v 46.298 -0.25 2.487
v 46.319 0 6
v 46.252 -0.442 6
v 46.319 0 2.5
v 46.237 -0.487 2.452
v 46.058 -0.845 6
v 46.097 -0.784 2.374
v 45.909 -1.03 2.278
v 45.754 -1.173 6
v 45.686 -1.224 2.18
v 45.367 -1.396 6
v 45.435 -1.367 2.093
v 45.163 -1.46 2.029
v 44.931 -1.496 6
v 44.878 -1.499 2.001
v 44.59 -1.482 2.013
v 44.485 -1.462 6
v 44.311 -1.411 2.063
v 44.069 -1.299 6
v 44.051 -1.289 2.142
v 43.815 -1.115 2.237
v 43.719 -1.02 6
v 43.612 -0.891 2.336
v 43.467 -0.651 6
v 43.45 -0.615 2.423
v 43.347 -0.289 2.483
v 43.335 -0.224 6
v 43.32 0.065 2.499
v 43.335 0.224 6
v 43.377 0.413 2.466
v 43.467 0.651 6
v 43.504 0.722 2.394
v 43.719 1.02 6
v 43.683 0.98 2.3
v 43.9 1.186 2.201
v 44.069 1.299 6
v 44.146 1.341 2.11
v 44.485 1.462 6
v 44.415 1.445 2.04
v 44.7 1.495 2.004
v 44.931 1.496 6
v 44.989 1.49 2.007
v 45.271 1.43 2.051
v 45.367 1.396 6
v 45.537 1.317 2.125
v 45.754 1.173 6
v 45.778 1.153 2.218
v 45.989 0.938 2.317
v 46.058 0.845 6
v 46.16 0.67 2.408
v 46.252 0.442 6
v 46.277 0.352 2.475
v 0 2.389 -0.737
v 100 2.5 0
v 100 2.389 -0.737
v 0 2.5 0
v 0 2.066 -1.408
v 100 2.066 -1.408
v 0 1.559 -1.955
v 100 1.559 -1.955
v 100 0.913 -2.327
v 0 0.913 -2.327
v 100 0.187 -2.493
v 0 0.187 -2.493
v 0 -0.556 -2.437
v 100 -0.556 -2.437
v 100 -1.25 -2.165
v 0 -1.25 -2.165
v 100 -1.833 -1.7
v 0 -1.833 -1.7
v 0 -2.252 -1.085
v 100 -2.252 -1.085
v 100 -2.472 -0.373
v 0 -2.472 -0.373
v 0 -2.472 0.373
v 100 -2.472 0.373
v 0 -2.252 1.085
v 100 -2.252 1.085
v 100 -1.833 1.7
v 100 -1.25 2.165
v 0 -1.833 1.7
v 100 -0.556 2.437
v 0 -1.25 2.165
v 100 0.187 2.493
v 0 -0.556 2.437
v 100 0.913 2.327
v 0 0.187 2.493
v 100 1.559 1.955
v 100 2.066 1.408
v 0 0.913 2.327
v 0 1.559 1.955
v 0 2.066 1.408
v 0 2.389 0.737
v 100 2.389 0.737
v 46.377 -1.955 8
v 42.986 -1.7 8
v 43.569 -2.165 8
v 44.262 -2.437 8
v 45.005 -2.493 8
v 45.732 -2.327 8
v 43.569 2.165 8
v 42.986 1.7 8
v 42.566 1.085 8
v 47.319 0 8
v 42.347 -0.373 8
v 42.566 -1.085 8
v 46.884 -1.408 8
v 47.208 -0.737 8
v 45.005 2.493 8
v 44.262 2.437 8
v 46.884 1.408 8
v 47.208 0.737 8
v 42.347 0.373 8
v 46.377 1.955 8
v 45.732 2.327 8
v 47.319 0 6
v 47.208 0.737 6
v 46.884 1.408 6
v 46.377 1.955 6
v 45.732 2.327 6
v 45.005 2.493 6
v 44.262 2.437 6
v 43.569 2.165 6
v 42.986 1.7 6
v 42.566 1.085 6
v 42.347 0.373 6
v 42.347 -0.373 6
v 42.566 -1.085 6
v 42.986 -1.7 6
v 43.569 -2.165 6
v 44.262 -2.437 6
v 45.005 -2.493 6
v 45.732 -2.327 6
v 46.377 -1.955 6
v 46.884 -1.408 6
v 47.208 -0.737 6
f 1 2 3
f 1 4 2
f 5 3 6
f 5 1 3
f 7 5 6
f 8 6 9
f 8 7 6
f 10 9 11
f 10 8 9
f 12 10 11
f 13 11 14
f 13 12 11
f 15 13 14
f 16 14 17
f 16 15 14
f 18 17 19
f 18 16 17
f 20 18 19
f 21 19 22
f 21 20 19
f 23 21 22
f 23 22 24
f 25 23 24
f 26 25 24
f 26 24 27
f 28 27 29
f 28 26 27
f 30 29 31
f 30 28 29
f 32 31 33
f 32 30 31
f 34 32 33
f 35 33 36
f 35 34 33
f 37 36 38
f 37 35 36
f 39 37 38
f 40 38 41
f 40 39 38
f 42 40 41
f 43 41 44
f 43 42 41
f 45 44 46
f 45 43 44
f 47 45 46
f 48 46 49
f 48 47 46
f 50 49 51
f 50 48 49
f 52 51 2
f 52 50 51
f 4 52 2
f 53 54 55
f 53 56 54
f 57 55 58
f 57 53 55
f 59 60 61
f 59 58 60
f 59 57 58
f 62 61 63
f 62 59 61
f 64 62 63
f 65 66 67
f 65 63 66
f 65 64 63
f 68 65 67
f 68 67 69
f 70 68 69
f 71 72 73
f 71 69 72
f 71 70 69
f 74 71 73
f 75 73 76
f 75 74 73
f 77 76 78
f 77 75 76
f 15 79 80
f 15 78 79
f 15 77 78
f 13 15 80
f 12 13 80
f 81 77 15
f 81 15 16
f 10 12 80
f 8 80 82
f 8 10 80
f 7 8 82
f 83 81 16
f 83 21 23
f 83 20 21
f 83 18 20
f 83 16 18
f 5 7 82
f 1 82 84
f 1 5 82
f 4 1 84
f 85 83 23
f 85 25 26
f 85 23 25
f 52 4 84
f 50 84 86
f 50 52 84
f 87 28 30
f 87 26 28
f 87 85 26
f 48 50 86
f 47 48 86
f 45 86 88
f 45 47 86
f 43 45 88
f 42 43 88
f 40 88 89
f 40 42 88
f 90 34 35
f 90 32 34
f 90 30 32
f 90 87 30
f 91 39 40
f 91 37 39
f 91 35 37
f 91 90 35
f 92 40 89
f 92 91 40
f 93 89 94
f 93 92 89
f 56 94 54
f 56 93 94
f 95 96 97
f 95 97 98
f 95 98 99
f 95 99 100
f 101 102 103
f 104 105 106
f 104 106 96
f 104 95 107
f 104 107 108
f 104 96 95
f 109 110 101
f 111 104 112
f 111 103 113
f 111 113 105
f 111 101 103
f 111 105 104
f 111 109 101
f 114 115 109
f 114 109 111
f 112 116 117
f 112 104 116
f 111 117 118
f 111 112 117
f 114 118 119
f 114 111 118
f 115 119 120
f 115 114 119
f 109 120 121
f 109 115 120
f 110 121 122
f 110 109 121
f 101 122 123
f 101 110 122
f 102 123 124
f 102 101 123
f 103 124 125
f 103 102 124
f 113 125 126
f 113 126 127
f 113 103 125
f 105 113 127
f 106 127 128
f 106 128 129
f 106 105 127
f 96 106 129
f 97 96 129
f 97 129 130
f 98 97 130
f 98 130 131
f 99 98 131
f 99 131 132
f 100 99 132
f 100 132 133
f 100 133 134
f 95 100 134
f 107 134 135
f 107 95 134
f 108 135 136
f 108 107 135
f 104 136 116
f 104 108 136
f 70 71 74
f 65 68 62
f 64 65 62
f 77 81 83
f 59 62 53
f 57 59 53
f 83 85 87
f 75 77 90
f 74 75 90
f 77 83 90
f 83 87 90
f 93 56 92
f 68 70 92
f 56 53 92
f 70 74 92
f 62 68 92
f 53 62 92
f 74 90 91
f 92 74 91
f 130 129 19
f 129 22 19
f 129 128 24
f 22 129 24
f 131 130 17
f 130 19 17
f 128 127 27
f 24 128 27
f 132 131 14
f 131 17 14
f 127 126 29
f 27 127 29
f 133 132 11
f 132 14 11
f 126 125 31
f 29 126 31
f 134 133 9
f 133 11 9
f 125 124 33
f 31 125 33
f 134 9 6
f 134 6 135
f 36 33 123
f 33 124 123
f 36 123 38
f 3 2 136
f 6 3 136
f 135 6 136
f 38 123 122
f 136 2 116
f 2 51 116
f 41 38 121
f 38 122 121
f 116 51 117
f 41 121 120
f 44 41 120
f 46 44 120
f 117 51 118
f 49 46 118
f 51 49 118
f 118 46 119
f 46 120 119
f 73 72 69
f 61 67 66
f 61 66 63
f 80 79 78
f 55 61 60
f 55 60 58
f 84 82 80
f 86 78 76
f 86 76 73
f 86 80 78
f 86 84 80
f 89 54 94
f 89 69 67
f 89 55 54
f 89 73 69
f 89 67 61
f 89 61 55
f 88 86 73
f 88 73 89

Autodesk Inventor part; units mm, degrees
ref_plane "YZ Plane" through (0, 0, 0) normal (1, 0, 0) x (0, 1, 0)
ref_plane "XZ Plane" through (0, 0, 0) normal (0, 1, 0) x (-1, 0, 0)
ref_plane "XY Plane" through (0, 0, 0) normal (0, 0, 1) x (1, 0, 0)
sketch "Sketch1" plane through (0, 0, 0) normal (1, 0, 0) x (0, 1, 0)
  circle A0 centre (0, 0) radius 2.5
  dimension "d0" = 5
extrude "Extrusion1" add sketch "Sketch1" along normal blind 100
sketch "Sketch2" plane through (0, 0, 0) normal (-1, 0, 0) x (0, 0, 1)
  point P0 (0, 0)
sketch "Sketch3" plane through (0, 0, 0) normal (-1, 0, 0) x (0, 0, 1)
  point P0 (0, 0)
sketch "Sketch4" plane through (0, 0, 0) normal (0, 0, 1) x (1, 0, 0)
  circle A0 centre (44.8186, 0) radius 1.5
  point P0 (0, 0)
  dimension "d3" = 3
extrude "Extrusion2" add sketch "Sketch4" along normal blind 8
sketch "Sketch5" plane through (44.8186, 0, 8) normal (0, 0, 1) x (1, 0, 0)
  circle A0 centre (0, 0) radius 2.5
  point P0 (-44.8186, 0)
  dimension "d6" = 5
extrude "Extrusion3" add sketch "Sketch5" against normal blind 2
properties part number "stylo part1"
